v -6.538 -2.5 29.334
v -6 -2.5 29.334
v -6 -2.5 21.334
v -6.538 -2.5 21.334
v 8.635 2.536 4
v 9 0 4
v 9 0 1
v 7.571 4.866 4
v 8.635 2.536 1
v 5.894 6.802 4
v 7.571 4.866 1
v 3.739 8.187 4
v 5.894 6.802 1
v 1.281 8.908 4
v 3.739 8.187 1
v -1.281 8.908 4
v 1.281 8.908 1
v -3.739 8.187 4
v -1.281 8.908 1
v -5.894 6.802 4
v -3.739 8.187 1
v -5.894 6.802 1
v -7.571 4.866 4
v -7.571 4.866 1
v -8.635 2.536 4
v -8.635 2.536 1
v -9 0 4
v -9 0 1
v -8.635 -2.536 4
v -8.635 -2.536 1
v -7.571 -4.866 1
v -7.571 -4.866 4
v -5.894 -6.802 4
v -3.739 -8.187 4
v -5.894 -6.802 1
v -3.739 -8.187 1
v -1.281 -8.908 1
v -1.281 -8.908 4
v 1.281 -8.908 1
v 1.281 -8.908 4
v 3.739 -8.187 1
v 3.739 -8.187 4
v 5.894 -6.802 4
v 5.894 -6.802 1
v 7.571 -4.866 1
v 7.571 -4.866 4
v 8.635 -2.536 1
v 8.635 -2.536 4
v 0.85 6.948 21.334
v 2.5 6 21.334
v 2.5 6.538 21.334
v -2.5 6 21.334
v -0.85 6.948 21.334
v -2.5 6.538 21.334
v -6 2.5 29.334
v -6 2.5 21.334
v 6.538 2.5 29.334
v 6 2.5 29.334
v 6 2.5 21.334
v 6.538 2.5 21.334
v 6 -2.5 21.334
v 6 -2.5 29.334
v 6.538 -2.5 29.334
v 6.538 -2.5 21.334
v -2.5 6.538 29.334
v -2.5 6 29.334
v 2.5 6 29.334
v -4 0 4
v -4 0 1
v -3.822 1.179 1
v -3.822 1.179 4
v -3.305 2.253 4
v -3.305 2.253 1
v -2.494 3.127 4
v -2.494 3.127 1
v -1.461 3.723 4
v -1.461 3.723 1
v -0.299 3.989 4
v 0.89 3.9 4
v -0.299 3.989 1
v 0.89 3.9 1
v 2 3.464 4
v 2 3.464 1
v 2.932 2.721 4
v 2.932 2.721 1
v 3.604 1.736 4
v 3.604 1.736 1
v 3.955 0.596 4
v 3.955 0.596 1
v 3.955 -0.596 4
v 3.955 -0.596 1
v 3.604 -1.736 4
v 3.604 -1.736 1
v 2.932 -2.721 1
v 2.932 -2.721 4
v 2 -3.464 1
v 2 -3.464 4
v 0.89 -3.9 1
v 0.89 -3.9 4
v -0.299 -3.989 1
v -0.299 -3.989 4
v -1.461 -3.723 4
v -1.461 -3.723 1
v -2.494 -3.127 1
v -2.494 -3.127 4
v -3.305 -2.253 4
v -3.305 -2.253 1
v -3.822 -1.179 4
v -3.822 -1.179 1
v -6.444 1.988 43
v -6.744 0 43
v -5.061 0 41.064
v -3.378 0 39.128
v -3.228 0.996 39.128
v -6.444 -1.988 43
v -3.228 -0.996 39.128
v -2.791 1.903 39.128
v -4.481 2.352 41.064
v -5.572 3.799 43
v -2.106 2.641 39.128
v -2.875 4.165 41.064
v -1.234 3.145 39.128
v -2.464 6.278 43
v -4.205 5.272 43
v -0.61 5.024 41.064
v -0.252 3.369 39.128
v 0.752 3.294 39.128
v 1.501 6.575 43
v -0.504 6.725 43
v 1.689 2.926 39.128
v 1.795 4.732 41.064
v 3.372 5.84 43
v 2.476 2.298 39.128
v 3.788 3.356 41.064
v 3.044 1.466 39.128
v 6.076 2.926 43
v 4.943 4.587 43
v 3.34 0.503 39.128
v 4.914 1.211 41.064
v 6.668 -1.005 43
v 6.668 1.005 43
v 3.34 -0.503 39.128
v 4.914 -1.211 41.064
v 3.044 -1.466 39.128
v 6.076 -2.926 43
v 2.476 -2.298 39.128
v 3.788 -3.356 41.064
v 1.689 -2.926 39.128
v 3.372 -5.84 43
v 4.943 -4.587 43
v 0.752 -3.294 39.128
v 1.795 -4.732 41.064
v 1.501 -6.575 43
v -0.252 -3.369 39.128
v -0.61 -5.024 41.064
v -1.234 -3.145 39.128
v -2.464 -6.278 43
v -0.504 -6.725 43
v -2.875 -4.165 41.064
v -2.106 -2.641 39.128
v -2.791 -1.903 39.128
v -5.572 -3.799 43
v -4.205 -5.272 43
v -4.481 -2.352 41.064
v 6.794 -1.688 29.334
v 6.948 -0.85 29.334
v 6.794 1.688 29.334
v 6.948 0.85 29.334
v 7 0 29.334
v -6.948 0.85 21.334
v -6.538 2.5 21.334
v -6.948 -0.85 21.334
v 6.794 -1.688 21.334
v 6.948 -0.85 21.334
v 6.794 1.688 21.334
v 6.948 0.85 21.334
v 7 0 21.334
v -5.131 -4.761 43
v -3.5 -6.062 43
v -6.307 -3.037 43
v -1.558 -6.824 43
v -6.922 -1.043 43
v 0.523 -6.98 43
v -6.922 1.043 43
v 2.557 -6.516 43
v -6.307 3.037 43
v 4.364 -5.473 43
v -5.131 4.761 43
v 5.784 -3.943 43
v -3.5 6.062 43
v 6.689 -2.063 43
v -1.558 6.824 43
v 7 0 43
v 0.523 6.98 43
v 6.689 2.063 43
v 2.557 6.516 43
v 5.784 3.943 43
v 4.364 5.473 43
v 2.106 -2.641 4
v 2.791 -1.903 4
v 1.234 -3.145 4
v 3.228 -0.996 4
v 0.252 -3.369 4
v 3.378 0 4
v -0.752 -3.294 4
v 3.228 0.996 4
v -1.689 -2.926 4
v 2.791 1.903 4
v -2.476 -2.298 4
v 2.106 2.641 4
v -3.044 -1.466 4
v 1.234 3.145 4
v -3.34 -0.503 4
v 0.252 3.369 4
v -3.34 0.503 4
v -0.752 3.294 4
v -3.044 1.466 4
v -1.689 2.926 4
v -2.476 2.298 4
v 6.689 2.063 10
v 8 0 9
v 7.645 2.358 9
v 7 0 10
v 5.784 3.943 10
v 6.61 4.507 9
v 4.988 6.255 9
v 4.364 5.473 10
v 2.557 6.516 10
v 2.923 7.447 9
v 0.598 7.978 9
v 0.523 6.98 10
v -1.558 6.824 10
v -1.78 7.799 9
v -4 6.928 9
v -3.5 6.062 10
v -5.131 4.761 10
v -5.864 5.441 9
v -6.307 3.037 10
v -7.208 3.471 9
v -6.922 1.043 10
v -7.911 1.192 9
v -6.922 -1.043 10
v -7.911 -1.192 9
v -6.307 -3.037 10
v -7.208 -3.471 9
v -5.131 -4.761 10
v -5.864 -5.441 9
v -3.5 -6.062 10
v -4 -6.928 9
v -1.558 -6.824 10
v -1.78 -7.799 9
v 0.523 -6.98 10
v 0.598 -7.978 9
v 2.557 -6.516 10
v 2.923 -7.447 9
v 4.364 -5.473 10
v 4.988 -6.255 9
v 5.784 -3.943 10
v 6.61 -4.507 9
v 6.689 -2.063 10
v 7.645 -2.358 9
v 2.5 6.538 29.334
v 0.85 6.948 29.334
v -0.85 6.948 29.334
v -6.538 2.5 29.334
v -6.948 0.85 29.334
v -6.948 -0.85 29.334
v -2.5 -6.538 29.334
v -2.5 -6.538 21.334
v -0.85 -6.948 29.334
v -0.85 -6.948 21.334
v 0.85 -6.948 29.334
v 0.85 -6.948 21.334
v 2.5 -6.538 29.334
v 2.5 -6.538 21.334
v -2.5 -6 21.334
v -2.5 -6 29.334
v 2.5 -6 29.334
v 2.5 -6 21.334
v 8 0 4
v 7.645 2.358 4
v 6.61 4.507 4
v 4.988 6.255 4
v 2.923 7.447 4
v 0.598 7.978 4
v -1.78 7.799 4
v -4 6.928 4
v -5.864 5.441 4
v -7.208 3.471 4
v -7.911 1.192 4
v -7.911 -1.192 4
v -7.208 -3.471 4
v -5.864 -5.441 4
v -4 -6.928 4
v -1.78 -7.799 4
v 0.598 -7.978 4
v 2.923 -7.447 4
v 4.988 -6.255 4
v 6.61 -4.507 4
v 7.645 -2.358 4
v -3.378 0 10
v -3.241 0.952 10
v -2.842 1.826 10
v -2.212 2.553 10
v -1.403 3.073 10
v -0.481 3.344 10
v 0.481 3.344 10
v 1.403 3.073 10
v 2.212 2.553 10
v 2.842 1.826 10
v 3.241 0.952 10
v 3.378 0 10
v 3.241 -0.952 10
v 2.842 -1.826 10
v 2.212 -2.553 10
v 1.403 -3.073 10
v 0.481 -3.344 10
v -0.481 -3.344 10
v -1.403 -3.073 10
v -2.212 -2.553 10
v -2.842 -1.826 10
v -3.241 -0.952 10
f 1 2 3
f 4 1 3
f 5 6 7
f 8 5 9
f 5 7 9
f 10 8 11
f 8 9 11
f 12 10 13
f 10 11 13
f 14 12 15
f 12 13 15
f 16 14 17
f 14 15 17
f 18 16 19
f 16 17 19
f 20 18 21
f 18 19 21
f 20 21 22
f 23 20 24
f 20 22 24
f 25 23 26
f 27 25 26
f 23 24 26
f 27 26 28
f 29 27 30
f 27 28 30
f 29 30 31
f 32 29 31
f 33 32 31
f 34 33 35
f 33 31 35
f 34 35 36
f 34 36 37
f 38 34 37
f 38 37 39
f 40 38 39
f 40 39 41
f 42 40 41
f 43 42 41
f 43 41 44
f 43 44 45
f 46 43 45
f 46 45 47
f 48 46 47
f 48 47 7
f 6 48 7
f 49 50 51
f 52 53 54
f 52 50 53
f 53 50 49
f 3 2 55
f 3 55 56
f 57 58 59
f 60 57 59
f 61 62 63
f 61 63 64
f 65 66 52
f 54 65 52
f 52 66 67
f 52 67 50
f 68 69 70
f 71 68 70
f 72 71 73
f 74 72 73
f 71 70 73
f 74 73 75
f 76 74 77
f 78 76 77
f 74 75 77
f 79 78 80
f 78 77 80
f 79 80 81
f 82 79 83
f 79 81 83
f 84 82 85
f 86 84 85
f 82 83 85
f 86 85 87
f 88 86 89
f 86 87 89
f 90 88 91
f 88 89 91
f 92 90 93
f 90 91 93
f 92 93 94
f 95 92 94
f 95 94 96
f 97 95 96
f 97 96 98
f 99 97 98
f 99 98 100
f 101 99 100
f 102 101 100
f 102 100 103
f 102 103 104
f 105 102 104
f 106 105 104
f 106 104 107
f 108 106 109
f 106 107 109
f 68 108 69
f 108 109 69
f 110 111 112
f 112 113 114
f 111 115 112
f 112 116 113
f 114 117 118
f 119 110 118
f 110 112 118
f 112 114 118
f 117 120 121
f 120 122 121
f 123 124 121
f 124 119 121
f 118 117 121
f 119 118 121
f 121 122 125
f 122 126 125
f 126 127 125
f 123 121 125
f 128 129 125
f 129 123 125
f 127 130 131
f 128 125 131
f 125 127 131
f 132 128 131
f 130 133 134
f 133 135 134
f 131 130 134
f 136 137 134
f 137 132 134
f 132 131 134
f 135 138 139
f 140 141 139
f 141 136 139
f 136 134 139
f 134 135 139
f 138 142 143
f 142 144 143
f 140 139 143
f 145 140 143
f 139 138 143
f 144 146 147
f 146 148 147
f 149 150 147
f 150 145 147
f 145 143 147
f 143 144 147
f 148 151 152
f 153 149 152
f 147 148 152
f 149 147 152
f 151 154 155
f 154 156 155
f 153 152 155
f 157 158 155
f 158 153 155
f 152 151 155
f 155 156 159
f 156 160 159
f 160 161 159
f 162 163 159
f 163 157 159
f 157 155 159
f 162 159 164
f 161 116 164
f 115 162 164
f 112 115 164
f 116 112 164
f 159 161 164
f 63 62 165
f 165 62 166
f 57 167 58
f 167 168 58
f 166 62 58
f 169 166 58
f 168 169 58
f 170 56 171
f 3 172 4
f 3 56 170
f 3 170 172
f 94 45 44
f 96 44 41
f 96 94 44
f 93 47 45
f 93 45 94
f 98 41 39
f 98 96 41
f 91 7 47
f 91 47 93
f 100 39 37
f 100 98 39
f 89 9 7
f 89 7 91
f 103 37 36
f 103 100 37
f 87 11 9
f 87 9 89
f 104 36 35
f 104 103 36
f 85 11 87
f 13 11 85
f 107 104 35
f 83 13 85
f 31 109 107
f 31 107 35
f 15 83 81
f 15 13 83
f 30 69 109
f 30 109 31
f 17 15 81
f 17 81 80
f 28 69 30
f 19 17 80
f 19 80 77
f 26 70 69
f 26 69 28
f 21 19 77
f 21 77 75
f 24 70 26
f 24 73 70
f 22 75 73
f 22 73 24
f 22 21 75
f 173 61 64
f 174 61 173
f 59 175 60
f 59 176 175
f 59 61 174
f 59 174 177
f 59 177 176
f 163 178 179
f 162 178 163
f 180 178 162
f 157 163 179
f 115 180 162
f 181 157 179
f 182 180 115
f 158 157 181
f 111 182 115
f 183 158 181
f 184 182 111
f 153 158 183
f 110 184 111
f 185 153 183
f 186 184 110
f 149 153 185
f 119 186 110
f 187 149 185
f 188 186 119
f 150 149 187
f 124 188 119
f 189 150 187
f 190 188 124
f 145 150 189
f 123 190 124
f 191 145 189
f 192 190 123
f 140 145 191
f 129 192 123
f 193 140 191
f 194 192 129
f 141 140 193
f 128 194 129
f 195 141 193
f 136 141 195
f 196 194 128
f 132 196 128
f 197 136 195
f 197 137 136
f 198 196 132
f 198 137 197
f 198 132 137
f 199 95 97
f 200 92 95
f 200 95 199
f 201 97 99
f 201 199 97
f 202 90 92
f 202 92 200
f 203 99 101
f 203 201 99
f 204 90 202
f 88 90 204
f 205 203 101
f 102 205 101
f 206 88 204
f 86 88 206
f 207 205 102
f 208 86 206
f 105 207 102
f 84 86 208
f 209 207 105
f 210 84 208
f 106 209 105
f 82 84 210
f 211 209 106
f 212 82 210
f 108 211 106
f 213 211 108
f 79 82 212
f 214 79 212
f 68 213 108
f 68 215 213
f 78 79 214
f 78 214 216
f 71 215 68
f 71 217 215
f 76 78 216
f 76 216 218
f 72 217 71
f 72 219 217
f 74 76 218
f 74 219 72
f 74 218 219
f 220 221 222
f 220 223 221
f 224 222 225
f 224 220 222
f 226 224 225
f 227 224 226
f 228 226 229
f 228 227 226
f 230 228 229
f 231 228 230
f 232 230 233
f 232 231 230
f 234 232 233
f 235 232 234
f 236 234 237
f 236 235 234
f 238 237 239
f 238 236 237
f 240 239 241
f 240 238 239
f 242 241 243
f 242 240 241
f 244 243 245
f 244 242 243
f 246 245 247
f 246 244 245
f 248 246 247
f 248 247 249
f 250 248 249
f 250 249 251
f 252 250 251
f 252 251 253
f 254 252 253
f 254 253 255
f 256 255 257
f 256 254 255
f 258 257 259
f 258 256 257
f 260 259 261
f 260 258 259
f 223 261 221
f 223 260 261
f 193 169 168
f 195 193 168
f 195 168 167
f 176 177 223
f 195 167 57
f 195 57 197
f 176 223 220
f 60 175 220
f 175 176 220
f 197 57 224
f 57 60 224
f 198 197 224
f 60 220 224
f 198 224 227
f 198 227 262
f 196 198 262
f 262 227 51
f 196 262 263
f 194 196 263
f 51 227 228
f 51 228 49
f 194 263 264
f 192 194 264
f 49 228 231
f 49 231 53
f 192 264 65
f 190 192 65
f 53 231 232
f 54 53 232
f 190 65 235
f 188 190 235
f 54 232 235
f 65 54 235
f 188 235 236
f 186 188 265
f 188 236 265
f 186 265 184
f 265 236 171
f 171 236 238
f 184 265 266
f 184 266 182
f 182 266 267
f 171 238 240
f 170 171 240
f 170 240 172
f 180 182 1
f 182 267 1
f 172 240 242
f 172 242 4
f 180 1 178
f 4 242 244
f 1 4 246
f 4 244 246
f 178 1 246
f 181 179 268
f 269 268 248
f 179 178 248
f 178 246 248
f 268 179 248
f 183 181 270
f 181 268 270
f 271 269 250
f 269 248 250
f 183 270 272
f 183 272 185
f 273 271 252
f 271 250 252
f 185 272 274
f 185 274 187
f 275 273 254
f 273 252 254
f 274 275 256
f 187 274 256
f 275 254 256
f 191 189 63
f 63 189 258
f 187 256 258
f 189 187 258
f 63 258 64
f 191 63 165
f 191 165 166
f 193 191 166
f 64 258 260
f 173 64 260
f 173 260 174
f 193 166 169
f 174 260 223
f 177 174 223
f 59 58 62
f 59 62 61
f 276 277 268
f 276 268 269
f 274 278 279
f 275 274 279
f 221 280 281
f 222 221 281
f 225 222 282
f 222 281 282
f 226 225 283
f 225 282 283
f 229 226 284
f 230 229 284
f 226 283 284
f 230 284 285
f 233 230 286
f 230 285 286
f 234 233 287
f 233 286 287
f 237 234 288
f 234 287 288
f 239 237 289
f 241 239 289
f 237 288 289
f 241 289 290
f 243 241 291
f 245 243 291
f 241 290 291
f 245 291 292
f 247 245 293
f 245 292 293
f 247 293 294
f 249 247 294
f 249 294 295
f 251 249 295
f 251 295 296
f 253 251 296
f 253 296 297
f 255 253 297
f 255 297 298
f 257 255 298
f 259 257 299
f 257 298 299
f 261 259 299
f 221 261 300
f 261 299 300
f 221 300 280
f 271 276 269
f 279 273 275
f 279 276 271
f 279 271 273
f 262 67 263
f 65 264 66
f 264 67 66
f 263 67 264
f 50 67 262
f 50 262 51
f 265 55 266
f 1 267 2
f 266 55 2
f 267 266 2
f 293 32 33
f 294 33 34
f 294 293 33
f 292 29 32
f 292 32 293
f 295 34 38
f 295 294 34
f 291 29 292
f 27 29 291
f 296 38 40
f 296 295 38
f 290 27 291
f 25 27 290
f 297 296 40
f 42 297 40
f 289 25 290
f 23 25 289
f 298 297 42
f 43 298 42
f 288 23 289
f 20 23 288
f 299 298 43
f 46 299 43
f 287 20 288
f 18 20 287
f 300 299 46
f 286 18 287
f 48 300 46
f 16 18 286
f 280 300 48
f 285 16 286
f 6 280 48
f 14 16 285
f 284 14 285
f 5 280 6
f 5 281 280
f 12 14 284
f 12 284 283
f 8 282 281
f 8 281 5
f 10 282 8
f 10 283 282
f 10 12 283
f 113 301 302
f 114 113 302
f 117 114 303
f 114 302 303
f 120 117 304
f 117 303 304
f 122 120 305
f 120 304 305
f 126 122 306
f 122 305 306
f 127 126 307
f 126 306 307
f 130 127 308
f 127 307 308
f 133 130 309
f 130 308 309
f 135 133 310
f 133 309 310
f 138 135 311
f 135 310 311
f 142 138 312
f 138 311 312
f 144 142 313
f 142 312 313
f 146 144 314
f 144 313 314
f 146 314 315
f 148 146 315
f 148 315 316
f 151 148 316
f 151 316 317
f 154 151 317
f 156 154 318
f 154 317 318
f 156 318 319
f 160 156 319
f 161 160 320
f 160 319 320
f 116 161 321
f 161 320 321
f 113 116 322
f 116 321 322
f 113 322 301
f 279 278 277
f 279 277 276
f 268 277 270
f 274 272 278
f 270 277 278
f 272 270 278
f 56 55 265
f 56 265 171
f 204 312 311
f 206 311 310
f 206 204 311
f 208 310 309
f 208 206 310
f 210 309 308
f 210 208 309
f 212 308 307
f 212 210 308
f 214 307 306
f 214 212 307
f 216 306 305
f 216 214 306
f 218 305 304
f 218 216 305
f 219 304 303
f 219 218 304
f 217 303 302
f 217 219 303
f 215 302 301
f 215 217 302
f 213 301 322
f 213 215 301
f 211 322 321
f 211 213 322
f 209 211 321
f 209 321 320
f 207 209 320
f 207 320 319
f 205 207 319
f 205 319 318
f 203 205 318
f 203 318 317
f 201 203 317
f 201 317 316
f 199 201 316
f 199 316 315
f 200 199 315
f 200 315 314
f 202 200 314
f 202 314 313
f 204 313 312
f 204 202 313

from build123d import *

# Parameters (mm, degrees)
SKETCH1_R                                           = 9
BOSS_EXTRUDE1_DEPTH                                 = 4
SKETCH2_R                                           = 7
BOSS_EXTRUDE2_DEPTH                                 = 39
CSK_FOR_1_4_FLAT_HEAD_SOCKET_CAP_SCREW1_D           = 6.7564
CSK_FOR_1_4_FLAT_HEAD_SOCKET_CAP_SCREW1_CSINK_D     = 13.4874
CSK_FOR_1_4_FLAT_HEAD_SOCKET_CAP_SCREW1_CSINK_ANGLE = 82
SKETCH6_R                                           = 16
CUT_EXTRUDE1_DEPTH                                  = 1
SKETCH7_R                                           = 4
CUT_EXTRUDE2_DEPTH                                  = 3
SKETCH9_W                                           = 8
SKETCH9_H                                           = 5
CUT_EXTRUDE3_DEPTH                                  = 3
CIRPATTERN1_COUNT                                   = 4
SKETCH10_R                                          = 8
BOSS_EXTRUDE3_DEPTH                                 = 5
SKETCH11_R                                          = 7
CUT_EXTRUDE4_START                                  = -9
SKETCH12_R                                          = 3.3782
CUT_EXTRUDE4_DEPTH                                  = 9


with BuildPart() as part:
    # Sketch1 → Boss-Extrude1 (new body)
    with BuildSketch(Plane.XY):
        Circle(SKETCH1_R)
    extrude(amount=BOSS_EXTRUDE1_DEPTH)

    # Sketch2 → Boss-Extrude2 (add)
    with BuildSketch(Plane.XY.offset(4)):
        Circle(SKETCH2_R)
    extrude(amount=BOSS_EXTRUDE2_DEPTH)

    # CSK for 1/4 Flat Head Socket Cap Screw1 (through all)
    with Locations(Plane.XY.offset(43)):
        with Locations((0, 0)):
            CounterSinkHole(CSK_FOR_1_4_FLAT_HEAD_SOCKET_CAP_SCREW1_D / 2, CSK_FOR_1_4_FLAT_HEAD_SOCKET_CAP_SCREW1_CSINK_D / 2, counter_sink_angle=CSK_FOR_1_4_FLAT_HEAD_SOCKET_CAP_SCREW1_CSINK_ANGLE)

    # Sketch6 → Cut-Extrude1 (cut)
    with BuildSketch(Plane(origin=(0, 0, 0), x_dir=(-1, 0, 0), z_dir=(0, 0, -1))):
        Circle(SKETCH6_R)
    extrude(amount=-CUT_EXTRUDE1_DEPTH, mode=Mode.SUBTRACT)

    # Sketch7 → Cut-Extrude2 (cut)
    with BuildSketch(Plane(origin=(0, 0, 1), x_dir=(-1, 0, 0), z_dir=(0, 0, -1))):
        Circle(SKETCH7_R)
    extrude(amount=-CUT_EXTRUDE2_DEPTH, mode=Mode.SUBTRACT)

    # Sketch9 → Cut-Extrude3 (cut)
    with BuildSketch(Plane(origin=(6, 0, 0), x_dir=(0, 0, -1), z_dir=(1, 0, 0))):
        with Locations((-25.333705971, 0)):
            Rectangle(SKETCH9_W, SKETCH9_H)
    cut_extrude3 = extrude(amount=CUT_EXTRUDE3_DEPTH, mode=Mode.SUBTRACT)

    # CirPattern1: Cut-Extrude3 ×4 about axis
    cirpattern1_axis = Axis((0, 0, 0), (0, 0, 1))
    for i in range(1, CIRPATTERN1_COUNT):
        add(cut_extrude3.rotate(cirpattern1_axis, i * 360 / CIRPATTERN1_COUNT), mode=Mode.SUBTRACT)

    # Sketch10 → Boss-Extrude3 (add)
    with BuildSketch(Plane.XY.offset(4)):
        Circle(SKETCH10_R)
    extrude(amount=BOSS_EXTRUDE3_DEPTH)

    # Sketch11 → section 1 of loft4
    with BuildSketch(Plane.XY.offset(10), mode=Mode.PRIVATE) as loft4_s1:
        Circle(SKETCH11_R)
    # loft up to a face of the part (loft4)
    loft([Face(Wire([part.edges().sort_by_distance((-5.476376847, 5.831749019, 9))[0]])), loft4_s1.sketch])

    # Sketch12 → Cut-Extrude4 (cut)
    with BuildSketch(Plane.XY.offset(10).offset(CUT_EXTRUDE4_START)):
        Circle(SKETCH12_R)
    extrude(amount=CUT_EXTRUDE4_DEPTH, mode=Mode.SUBTRACT)


solid = part.part
